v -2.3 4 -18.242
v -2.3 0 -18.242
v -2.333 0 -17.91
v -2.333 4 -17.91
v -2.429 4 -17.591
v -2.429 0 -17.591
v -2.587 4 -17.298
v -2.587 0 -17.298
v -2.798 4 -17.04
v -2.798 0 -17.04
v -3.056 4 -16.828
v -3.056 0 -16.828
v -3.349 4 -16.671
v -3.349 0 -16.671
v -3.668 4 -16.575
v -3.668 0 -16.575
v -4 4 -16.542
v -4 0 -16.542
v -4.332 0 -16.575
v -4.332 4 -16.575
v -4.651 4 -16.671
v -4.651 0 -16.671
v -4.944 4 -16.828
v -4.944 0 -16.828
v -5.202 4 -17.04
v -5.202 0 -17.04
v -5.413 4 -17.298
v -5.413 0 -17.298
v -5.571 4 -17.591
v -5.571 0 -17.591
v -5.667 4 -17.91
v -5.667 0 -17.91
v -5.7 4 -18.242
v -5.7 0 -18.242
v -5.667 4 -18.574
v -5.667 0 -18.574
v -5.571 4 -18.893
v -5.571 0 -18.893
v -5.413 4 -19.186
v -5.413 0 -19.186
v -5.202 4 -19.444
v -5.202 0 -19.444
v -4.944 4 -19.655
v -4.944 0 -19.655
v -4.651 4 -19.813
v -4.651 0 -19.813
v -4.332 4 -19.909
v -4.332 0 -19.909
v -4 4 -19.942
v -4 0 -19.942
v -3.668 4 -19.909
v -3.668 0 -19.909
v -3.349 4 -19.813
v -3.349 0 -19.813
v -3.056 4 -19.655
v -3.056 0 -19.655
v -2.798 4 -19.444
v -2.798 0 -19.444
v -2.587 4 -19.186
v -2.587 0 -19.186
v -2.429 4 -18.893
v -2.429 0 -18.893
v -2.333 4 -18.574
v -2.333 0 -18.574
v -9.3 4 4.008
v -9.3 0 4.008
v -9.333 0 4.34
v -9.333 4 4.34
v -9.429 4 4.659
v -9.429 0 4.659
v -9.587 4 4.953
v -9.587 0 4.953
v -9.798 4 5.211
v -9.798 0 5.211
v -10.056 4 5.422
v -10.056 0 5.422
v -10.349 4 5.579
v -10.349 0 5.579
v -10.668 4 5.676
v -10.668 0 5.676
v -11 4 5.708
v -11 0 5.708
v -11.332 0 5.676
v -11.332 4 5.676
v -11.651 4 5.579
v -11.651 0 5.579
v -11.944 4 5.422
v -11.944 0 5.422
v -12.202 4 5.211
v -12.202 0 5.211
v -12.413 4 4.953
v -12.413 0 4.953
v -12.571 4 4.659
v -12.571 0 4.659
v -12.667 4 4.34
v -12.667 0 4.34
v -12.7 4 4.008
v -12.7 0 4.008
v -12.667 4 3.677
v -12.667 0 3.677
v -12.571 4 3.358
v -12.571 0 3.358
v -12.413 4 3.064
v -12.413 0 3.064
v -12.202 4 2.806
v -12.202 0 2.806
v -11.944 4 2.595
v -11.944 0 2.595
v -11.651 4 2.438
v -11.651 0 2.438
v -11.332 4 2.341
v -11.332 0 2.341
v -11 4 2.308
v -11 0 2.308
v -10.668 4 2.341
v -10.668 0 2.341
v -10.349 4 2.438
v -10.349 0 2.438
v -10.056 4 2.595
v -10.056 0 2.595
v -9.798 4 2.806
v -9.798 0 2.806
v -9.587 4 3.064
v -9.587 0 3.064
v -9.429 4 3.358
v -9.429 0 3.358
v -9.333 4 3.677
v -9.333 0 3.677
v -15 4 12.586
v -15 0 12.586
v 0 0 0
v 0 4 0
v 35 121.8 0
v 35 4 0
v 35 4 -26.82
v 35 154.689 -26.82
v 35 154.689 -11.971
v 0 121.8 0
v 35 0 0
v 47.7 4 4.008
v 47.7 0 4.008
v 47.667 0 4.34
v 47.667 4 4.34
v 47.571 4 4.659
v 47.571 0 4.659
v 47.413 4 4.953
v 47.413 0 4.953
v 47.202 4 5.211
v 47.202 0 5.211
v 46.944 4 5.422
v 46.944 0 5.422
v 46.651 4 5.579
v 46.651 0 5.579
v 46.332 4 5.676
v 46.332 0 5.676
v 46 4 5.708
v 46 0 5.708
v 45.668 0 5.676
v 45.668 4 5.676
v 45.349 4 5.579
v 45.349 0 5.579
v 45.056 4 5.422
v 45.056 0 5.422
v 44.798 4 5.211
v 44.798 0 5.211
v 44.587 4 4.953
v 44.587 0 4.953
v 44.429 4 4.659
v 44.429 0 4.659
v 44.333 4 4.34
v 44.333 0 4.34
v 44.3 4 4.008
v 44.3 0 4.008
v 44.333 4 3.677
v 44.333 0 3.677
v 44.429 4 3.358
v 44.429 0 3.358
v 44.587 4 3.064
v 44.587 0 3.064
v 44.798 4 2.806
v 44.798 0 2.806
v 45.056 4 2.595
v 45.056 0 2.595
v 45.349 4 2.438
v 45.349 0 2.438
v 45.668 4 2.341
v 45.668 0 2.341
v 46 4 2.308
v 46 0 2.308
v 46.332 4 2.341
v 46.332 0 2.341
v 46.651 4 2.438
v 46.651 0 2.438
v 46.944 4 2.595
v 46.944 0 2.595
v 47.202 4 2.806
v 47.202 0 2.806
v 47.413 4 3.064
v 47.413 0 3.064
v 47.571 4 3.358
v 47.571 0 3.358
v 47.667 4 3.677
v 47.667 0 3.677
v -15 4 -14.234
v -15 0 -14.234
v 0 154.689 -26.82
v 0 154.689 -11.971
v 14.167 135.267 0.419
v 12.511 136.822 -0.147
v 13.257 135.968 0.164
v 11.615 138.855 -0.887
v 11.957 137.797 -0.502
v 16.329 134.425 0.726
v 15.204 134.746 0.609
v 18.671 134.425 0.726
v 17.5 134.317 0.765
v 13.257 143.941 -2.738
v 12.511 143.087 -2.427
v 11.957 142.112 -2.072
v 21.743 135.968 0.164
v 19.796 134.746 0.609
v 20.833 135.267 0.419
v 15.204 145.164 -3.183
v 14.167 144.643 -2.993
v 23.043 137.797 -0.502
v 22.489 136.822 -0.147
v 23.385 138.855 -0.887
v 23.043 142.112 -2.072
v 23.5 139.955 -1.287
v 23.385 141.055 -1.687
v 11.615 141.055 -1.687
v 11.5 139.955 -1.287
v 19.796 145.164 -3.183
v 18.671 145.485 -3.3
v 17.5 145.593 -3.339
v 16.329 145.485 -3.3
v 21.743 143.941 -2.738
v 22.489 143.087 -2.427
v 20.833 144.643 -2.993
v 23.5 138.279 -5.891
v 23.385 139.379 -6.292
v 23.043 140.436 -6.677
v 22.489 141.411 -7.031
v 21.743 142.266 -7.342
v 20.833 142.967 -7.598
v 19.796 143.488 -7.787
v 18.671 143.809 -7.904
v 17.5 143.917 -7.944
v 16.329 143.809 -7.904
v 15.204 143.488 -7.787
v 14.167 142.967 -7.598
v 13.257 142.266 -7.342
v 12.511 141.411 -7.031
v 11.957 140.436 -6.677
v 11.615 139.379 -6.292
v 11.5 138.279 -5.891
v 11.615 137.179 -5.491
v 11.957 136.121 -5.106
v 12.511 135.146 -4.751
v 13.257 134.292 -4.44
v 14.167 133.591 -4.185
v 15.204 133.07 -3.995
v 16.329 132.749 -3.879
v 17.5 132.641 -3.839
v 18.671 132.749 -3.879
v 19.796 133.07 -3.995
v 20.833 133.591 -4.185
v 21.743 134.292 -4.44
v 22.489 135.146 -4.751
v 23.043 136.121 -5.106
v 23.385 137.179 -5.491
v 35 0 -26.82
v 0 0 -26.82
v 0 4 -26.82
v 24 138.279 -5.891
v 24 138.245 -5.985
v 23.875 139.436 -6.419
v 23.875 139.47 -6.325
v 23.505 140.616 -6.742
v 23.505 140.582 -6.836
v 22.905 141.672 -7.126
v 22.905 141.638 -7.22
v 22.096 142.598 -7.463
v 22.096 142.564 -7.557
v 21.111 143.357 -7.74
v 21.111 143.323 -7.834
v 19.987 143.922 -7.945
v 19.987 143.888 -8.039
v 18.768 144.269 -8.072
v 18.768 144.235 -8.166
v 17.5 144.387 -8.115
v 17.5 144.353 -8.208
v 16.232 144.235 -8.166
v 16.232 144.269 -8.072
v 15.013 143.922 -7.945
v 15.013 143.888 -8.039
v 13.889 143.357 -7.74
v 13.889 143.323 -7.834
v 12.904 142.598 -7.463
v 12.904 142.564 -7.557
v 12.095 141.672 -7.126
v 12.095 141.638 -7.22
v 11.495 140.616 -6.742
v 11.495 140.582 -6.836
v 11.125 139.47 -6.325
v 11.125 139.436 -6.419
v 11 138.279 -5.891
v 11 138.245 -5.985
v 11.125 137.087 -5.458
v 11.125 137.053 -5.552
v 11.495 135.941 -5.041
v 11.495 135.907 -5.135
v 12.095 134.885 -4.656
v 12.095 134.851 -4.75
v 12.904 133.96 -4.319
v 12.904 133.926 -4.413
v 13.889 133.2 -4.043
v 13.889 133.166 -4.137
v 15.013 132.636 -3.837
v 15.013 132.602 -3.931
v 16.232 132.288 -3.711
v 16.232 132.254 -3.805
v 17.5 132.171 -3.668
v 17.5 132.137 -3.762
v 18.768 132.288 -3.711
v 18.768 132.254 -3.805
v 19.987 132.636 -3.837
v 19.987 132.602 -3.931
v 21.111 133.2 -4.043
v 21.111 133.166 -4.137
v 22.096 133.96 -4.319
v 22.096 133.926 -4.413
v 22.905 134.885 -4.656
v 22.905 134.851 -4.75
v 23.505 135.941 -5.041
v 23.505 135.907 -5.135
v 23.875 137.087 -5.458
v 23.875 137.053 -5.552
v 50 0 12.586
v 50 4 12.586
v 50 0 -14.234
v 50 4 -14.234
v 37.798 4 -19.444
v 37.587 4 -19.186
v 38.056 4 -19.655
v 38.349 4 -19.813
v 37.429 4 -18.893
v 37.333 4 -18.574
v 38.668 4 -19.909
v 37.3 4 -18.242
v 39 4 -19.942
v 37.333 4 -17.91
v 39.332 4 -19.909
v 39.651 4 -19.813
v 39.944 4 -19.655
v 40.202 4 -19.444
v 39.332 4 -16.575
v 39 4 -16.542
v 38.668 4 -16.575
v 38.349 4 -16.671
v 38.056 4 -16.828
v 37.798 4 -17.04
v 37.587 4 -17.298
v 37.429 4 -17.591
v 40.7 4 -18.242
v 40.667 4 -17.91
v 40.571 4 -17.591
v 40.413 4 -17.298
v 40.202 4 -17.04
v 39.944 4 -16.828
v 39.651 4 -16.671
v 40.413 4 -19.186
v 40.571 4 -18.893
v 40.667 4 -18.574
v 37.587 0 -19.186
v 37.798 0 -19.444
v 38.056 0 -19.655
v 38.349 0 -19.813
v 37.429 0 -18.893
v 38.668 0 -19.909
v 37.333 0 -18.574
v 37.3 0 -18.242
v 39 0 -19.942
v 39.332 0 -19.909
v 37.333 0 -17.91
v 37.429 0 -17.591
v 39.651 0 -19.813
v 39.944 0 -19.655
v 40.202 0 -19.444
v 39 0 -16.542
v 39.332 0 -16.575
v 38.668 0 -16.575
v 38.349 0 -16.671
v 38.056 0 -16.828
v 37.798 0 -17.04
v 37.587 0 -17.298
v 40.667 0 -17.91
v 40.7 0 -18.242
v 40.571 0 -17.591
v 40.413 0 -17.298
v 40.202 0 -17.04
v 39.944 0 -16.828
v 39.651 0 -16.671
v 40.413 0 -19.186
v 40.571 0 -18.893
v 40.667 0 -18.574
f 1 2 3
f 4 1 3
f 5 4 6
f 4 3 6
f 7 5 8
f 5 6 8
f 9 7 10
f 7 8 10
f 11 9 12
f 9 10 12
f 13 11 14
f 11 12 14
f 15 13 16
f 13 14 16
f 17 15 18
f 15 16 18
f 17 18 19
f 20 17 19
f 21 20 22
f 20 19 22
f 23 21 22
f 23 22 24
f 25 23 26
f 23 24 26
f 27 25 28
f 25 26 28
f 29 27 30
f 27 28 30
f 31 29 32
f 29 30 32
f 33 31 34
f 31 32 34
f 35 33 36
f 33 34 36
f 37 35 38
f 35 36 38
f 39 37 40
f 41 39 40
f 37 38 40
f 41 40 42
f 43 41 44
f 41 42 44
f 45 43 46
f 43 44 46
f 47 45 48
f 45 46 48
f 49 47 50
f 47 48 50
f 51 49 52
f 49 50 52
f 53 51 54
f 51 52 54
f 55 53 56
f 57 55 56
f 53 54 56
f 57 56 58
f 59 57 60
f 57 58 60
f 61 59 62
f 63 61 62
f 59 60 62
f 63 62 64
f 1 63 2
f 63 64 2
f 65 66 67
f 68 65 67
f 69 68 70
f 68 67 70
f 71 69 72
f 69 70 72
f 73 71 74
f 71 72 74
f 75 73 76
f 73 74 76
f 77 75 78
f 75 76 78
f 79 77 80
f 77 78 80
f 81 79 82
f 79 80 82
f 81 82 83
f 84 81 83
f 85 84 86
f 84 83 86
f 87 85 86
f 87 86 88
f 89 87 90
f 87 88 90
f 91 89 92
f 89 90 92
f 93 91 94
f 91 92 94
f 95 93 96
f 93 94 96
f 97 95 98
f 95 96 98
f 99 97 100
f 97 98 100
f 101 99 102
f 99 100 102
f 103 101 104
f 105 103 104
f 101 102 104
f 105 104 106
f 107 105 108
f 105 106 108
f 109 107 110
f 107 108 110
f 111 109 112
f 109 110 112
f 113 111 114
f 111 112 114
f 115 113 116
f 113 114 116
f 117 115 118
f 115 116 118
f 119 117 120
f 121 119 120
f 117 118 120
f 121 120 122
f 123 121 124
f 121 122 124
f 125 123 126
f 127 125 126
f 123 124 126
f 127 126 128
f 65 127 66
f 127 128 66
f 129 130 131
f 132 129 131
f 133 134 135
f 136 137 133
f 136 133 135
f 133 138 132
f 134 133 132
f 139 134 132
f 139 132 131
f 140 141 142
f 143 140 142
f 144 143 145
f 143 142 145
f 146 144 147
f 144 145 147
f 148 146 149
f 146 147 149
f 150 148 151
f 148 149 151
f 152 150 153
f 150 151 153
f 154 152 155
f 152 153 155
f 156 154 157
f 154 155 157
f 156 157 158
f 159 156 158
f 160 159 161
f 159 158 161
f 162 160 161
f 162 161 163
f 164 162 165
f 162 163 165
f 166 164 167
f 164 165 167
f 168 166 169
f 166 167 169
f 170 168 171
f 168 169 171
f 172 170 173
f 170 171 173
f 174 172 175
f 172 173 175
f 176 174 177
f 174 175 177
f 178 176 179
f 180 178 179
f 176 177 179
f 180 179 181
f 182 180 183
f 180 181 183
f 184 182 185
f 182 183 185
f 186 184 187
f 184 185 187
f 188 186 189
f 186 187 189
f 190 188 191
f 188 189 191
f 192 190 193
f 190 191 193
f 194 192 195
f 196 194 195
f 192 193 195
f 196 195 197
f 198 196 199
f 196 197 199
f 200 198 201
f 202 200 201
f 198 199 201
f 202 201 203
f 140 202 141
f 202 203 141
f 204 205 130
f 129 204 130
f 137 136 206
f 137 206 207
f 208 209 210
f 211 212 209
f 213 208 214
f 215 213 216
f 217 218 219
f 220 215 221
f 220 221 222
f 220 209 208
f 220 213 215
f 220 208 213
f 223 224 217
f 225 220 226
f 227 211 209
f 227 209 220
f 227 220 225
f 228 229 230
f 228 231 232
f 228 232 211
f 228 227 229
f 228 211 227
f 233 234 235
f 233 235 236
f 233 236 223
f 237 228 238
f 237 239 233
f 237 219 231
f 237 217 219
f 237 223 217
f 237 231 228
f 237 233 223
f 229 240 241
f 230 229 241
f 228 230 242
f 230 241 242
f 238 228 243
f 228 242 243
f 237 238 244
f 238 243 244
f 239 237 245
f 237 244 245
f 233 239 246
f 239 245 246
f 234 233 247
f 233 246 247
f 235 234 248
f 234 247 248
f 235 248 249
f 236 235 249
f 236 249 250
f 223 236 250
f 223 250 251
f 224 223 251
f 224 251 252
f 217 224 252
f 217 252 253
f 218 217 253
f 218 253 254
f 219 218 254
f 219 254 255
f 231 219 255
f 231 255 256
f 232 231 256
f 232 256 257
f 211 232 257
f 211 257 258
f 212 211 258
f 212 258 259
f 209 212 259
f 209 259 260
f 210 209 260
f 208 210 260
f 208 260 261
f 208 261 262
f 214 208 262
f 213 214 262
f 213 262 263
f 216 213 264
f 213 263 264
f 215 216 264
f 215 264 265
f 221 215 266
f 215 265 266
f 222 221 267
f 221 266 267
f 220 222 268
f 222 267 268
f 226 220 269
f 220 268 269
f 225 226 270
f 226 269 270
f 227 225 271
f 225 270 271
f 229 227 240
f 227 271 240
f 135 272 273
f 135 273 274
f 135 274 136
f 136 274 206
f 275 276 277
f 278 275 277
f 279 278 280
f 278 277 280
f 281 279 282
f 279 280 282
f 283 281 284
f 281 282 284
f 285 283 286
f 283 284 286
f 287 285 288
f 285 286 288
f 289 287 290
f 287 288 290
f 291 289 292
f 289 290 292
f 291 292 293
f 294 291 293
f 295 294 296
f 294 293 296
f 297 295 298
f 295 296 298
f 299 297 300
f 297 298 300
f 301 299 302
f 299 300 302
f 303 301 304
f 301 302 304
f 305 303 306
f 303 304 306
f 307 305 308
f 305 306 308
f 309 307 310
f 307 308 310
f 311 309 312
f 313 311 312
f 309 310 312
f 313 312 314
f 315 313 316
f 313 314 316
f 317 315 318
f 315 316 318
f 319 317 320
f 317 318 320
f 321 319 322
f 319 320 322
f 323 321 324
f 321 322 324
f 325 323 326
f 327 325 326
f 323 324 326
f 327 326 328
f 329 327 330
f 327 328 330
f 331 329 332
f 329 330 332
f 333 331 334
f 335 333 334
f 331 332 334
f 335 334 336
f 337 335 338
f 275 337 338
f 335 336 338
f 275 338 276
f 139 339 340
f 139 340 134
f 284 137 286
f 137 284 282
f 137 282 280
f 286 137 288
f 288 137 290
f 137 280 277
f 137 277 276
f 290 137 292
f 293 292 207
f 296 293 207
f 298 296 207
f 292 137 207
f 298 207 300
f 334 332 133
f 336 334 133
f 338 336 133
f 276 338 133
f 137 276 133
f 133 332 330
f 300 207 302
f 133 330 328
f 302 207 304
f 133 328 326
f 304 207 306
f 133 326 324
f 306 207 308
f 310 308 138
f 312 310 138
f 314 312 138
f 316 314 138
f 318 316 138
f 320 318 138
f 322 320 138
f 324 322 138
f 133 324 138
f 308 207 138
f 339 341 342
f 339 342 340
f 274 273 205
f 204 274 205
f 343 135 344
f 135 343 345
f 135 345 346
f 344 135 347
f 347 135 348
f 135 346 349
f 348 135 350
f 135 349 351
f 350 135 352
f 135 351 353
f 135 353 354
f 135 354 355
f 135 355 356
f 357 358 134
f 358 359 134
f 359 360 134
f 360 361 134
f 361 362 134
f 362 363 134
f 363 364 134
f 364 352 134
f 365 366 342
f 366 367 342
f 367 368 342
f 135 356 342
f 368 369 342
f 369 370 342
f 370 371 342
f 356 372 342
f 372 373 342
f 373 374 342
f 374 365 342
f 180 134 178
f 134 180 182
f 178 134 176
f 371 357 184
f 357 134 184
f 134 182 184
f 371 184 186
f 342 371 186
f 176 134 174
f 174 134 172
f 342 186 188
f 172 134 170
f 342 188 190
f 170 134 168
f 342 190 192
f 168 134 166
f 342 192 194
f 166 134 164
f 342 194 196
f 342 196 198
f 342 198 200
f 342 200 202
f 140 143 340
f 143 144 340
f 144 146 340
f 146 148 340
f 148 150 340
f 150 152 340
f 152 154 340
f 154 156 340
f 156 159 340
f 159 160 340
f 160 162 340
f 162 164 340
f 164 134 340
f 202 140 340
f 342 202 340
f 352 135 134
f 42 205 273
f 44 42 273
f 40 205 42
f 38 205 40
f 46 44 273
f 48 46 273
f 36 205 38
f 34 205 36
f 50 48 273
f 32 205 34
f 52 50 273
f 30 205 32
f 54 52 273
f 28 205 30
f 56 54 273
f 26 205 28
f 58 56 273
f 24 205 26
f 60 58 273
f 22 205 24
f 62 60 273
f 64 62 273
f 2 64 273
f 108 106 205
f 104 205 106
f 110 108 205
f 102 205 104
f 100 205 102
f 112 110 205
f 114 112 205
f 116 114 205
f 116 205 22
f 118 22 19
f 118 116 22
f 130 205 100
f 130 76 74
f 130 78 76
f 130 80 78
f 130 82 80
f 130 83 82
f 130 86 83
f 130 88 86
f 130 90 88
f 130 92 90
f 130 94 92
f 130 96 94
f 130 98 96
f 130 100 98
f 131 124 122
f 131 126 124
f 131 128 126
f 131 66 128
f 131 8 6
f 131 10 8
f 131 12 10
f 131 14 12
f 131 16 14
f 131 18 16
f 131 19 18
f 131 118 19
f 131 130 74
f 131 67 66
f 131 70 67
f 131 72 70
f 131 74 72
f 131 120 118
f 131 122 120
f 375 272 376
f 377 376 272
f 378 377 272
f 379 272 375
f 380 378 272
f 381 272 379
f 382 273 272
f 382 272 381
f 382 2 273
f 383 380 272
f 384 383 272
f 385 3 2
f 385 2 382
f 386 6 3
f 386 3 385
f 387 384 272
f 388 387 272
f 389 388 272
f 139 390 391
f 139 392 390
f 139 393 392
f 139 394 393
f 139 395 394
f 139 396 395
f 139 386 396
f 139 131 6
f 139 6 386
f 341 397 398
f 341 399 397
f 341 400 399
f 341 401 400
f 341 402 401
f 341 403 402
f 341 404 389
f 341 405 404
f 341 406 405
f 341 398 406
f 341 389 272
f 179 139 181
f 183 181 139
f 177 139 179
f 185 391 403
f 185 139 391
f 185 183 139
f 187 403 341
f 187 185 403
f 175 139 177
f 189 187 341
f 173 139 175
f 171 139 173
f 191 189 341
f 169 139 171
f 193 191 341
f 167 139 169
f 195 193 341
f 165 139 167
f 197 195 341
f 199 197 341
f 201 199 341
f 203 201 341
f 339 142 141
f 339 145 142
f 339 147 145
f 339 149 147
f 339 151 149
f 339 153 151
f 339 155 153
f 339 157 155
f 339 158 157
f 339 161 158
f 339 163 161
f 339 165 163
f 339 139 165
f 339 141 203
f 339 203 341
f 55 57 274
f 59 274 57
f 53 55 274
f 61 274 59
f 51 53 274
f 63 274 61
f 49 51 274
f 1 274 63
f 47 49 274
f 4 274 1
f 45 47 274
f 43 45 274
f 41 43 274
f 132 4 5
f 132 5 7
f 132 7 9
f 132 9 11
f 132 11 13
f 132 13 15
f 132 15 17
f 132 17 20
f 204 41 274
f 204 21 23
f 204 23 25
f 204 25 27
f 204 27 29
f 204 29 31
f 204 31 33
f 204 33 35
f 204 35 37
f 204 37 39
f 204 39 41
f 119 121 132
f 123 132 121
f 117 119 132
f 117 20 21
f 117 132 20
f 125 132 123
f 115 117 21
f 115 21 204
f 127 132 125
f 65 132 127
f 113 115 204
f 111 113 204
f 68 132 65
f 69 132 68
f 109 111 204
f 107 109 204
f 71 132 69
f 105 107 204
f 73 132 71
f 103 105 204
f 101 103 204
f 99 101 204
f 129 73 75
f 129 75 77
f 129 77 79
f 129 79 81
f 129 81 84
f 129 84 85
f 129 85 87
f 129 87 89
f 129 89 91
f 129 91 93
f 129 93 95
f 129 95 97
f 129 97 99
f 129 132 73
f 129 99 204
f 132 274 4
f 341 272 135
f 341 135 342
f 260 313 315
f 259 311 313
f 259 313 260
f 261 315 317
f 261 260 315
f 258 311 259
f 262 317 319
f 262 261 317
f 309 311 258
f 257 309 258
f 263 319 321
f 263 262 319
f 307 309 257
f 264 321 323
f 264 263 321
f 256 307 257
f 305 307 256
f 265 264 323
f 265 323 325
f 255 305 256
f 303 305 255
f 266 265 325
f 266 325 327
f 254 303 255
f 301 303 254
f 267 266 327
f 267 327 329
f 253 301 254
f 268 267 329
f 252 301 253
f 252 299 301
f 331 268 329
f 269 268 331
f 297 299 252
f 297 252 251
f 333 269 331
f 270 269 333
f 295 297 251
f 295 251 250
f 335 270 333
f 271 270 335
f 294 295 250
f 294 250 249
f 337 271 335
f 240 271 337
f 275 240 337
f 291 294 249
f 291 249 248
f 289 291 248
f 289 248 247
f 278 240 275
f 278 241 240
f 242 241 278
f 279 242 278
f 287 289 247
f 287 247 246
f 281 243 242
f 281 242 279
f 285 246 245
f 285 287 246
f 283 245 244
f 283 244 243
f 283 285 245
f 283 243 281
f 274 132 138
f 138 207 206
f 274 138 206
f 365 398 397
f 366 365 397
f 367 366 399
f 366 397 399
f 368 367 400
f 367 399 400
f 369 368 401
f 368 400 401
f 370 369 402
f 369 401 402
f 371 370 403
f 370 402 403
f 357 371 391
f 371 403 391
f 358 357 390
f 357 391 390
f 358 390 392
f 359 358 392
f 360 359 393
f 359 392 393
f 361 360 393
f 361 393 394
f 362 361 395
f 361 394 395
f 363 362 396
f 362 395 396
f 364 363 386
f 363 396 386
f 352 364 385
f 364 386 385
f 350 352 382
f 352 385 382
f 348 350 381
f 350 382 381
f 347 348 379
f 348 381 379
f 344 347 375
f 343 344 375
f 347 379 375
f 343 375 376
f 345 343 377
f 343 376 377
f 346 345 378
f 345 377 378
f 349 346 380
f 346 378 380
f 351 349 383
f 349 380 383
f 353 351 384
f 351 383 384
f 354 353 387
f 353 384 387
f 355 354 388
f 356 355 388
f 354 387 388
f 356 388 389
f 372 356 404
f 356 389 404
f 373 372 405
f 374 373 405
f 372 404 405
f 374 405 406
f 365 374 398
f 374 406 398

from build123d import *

# Parameters (mm, degrees)
AUFSATZ_LINEAR_AUSTRAGEN1_DEPTH = 35
SKIZZE3_R                       = 6
AUFSATZ_LINEAR_AUSTRAGEN2_DEPTH = 5
SKIZZE4_R                       = 6.5
AUFSATZ_LINEAR_AUSTRAGEN3_DEPTH = 0.1
SKIZZE9_R                       = 1.7
AUFSATZ_LINEAR_AUSTRAGEN4_DEPTH = 4


with BuildPart() as part:
    # Skizze1 → Aufsatz-Linear austragen1 (new body)
    with BuildSketch(Plane(origin=(0, 0, 0), x_dir=(0, 0, -1), z_dir=(1, 0, 0))):
        Polygon((0, 0), (11.970705016, 0), (26.82, 0), (26.82, 154.689241728), (11.970705016, 154.689241728), (0, 121.8), align=None)
    extrude(amount=AUFSATZ_LINEAR_AUSTRAGEN1_DEPTH)

    # Skizze3 → Aufsatz-Linear austragen2 (add)
    with BuildSketch(Plane(origin=(0, 14.247893414, 39.14576543), x_dir=(1, 0, 0), z_dir=(0, 0.342020143, 0.939692621))):
        with Locations((17.5, 131.954561212)):
            Circle(SKIZZE3_R)
    extrude(amount=AUFSATZ_LINEAR_AUSTRAGEN2_DEPTH)

    # Skizze4 → Aufsatz-Linear austragen3 (add)
    with BuildSketch(Plane(origin=(0, 14.247893414, 39.14576543), x_dir=(1, 0, 0), z_dir=(0, 0.342020143, 0.939692621))):
        with Locations((17.5, 131.954561212)):
            Circle(SKIZZE4_R)
    extrude(amount=AUFSATZ_LINEAR_AUSTRAGEN3_DEPTH)

    # Skizze9 → Aufsatz-Linear austragen4 (add)
    with BuildSketch(Plane.XZ):
        Polygon((35, -26.82), (50, -14.233505532), (50, 12.586494468), (35, 0), align=None)
        with Locations((46, 4.008466786)):
            Circle(SKIZZE9_R, mode=Mode.SUBTRACT)
        with Locations((39, -18.241972318)):
            Circle(SKIZZE9_R, mode=Mode.SUBTRACT)
        Polygon((0, 0), (0, -26.82), (-15, -14.233505532), (-15, 12.586494468), align=None)
        with Locations((-4, -18.241972318)):
            Circle(SKIZZE9_R, mode=Mode.SUBTRACT)
        with Locations((-11, 4.008466786)):
            Circle(SKIZZE9_R, mode=Mode.SUBTRACT)
    extrude(amount=-AUFSATZ_LINEAR_AUSTRAGEN4_DEPTH)


solid = part.part
